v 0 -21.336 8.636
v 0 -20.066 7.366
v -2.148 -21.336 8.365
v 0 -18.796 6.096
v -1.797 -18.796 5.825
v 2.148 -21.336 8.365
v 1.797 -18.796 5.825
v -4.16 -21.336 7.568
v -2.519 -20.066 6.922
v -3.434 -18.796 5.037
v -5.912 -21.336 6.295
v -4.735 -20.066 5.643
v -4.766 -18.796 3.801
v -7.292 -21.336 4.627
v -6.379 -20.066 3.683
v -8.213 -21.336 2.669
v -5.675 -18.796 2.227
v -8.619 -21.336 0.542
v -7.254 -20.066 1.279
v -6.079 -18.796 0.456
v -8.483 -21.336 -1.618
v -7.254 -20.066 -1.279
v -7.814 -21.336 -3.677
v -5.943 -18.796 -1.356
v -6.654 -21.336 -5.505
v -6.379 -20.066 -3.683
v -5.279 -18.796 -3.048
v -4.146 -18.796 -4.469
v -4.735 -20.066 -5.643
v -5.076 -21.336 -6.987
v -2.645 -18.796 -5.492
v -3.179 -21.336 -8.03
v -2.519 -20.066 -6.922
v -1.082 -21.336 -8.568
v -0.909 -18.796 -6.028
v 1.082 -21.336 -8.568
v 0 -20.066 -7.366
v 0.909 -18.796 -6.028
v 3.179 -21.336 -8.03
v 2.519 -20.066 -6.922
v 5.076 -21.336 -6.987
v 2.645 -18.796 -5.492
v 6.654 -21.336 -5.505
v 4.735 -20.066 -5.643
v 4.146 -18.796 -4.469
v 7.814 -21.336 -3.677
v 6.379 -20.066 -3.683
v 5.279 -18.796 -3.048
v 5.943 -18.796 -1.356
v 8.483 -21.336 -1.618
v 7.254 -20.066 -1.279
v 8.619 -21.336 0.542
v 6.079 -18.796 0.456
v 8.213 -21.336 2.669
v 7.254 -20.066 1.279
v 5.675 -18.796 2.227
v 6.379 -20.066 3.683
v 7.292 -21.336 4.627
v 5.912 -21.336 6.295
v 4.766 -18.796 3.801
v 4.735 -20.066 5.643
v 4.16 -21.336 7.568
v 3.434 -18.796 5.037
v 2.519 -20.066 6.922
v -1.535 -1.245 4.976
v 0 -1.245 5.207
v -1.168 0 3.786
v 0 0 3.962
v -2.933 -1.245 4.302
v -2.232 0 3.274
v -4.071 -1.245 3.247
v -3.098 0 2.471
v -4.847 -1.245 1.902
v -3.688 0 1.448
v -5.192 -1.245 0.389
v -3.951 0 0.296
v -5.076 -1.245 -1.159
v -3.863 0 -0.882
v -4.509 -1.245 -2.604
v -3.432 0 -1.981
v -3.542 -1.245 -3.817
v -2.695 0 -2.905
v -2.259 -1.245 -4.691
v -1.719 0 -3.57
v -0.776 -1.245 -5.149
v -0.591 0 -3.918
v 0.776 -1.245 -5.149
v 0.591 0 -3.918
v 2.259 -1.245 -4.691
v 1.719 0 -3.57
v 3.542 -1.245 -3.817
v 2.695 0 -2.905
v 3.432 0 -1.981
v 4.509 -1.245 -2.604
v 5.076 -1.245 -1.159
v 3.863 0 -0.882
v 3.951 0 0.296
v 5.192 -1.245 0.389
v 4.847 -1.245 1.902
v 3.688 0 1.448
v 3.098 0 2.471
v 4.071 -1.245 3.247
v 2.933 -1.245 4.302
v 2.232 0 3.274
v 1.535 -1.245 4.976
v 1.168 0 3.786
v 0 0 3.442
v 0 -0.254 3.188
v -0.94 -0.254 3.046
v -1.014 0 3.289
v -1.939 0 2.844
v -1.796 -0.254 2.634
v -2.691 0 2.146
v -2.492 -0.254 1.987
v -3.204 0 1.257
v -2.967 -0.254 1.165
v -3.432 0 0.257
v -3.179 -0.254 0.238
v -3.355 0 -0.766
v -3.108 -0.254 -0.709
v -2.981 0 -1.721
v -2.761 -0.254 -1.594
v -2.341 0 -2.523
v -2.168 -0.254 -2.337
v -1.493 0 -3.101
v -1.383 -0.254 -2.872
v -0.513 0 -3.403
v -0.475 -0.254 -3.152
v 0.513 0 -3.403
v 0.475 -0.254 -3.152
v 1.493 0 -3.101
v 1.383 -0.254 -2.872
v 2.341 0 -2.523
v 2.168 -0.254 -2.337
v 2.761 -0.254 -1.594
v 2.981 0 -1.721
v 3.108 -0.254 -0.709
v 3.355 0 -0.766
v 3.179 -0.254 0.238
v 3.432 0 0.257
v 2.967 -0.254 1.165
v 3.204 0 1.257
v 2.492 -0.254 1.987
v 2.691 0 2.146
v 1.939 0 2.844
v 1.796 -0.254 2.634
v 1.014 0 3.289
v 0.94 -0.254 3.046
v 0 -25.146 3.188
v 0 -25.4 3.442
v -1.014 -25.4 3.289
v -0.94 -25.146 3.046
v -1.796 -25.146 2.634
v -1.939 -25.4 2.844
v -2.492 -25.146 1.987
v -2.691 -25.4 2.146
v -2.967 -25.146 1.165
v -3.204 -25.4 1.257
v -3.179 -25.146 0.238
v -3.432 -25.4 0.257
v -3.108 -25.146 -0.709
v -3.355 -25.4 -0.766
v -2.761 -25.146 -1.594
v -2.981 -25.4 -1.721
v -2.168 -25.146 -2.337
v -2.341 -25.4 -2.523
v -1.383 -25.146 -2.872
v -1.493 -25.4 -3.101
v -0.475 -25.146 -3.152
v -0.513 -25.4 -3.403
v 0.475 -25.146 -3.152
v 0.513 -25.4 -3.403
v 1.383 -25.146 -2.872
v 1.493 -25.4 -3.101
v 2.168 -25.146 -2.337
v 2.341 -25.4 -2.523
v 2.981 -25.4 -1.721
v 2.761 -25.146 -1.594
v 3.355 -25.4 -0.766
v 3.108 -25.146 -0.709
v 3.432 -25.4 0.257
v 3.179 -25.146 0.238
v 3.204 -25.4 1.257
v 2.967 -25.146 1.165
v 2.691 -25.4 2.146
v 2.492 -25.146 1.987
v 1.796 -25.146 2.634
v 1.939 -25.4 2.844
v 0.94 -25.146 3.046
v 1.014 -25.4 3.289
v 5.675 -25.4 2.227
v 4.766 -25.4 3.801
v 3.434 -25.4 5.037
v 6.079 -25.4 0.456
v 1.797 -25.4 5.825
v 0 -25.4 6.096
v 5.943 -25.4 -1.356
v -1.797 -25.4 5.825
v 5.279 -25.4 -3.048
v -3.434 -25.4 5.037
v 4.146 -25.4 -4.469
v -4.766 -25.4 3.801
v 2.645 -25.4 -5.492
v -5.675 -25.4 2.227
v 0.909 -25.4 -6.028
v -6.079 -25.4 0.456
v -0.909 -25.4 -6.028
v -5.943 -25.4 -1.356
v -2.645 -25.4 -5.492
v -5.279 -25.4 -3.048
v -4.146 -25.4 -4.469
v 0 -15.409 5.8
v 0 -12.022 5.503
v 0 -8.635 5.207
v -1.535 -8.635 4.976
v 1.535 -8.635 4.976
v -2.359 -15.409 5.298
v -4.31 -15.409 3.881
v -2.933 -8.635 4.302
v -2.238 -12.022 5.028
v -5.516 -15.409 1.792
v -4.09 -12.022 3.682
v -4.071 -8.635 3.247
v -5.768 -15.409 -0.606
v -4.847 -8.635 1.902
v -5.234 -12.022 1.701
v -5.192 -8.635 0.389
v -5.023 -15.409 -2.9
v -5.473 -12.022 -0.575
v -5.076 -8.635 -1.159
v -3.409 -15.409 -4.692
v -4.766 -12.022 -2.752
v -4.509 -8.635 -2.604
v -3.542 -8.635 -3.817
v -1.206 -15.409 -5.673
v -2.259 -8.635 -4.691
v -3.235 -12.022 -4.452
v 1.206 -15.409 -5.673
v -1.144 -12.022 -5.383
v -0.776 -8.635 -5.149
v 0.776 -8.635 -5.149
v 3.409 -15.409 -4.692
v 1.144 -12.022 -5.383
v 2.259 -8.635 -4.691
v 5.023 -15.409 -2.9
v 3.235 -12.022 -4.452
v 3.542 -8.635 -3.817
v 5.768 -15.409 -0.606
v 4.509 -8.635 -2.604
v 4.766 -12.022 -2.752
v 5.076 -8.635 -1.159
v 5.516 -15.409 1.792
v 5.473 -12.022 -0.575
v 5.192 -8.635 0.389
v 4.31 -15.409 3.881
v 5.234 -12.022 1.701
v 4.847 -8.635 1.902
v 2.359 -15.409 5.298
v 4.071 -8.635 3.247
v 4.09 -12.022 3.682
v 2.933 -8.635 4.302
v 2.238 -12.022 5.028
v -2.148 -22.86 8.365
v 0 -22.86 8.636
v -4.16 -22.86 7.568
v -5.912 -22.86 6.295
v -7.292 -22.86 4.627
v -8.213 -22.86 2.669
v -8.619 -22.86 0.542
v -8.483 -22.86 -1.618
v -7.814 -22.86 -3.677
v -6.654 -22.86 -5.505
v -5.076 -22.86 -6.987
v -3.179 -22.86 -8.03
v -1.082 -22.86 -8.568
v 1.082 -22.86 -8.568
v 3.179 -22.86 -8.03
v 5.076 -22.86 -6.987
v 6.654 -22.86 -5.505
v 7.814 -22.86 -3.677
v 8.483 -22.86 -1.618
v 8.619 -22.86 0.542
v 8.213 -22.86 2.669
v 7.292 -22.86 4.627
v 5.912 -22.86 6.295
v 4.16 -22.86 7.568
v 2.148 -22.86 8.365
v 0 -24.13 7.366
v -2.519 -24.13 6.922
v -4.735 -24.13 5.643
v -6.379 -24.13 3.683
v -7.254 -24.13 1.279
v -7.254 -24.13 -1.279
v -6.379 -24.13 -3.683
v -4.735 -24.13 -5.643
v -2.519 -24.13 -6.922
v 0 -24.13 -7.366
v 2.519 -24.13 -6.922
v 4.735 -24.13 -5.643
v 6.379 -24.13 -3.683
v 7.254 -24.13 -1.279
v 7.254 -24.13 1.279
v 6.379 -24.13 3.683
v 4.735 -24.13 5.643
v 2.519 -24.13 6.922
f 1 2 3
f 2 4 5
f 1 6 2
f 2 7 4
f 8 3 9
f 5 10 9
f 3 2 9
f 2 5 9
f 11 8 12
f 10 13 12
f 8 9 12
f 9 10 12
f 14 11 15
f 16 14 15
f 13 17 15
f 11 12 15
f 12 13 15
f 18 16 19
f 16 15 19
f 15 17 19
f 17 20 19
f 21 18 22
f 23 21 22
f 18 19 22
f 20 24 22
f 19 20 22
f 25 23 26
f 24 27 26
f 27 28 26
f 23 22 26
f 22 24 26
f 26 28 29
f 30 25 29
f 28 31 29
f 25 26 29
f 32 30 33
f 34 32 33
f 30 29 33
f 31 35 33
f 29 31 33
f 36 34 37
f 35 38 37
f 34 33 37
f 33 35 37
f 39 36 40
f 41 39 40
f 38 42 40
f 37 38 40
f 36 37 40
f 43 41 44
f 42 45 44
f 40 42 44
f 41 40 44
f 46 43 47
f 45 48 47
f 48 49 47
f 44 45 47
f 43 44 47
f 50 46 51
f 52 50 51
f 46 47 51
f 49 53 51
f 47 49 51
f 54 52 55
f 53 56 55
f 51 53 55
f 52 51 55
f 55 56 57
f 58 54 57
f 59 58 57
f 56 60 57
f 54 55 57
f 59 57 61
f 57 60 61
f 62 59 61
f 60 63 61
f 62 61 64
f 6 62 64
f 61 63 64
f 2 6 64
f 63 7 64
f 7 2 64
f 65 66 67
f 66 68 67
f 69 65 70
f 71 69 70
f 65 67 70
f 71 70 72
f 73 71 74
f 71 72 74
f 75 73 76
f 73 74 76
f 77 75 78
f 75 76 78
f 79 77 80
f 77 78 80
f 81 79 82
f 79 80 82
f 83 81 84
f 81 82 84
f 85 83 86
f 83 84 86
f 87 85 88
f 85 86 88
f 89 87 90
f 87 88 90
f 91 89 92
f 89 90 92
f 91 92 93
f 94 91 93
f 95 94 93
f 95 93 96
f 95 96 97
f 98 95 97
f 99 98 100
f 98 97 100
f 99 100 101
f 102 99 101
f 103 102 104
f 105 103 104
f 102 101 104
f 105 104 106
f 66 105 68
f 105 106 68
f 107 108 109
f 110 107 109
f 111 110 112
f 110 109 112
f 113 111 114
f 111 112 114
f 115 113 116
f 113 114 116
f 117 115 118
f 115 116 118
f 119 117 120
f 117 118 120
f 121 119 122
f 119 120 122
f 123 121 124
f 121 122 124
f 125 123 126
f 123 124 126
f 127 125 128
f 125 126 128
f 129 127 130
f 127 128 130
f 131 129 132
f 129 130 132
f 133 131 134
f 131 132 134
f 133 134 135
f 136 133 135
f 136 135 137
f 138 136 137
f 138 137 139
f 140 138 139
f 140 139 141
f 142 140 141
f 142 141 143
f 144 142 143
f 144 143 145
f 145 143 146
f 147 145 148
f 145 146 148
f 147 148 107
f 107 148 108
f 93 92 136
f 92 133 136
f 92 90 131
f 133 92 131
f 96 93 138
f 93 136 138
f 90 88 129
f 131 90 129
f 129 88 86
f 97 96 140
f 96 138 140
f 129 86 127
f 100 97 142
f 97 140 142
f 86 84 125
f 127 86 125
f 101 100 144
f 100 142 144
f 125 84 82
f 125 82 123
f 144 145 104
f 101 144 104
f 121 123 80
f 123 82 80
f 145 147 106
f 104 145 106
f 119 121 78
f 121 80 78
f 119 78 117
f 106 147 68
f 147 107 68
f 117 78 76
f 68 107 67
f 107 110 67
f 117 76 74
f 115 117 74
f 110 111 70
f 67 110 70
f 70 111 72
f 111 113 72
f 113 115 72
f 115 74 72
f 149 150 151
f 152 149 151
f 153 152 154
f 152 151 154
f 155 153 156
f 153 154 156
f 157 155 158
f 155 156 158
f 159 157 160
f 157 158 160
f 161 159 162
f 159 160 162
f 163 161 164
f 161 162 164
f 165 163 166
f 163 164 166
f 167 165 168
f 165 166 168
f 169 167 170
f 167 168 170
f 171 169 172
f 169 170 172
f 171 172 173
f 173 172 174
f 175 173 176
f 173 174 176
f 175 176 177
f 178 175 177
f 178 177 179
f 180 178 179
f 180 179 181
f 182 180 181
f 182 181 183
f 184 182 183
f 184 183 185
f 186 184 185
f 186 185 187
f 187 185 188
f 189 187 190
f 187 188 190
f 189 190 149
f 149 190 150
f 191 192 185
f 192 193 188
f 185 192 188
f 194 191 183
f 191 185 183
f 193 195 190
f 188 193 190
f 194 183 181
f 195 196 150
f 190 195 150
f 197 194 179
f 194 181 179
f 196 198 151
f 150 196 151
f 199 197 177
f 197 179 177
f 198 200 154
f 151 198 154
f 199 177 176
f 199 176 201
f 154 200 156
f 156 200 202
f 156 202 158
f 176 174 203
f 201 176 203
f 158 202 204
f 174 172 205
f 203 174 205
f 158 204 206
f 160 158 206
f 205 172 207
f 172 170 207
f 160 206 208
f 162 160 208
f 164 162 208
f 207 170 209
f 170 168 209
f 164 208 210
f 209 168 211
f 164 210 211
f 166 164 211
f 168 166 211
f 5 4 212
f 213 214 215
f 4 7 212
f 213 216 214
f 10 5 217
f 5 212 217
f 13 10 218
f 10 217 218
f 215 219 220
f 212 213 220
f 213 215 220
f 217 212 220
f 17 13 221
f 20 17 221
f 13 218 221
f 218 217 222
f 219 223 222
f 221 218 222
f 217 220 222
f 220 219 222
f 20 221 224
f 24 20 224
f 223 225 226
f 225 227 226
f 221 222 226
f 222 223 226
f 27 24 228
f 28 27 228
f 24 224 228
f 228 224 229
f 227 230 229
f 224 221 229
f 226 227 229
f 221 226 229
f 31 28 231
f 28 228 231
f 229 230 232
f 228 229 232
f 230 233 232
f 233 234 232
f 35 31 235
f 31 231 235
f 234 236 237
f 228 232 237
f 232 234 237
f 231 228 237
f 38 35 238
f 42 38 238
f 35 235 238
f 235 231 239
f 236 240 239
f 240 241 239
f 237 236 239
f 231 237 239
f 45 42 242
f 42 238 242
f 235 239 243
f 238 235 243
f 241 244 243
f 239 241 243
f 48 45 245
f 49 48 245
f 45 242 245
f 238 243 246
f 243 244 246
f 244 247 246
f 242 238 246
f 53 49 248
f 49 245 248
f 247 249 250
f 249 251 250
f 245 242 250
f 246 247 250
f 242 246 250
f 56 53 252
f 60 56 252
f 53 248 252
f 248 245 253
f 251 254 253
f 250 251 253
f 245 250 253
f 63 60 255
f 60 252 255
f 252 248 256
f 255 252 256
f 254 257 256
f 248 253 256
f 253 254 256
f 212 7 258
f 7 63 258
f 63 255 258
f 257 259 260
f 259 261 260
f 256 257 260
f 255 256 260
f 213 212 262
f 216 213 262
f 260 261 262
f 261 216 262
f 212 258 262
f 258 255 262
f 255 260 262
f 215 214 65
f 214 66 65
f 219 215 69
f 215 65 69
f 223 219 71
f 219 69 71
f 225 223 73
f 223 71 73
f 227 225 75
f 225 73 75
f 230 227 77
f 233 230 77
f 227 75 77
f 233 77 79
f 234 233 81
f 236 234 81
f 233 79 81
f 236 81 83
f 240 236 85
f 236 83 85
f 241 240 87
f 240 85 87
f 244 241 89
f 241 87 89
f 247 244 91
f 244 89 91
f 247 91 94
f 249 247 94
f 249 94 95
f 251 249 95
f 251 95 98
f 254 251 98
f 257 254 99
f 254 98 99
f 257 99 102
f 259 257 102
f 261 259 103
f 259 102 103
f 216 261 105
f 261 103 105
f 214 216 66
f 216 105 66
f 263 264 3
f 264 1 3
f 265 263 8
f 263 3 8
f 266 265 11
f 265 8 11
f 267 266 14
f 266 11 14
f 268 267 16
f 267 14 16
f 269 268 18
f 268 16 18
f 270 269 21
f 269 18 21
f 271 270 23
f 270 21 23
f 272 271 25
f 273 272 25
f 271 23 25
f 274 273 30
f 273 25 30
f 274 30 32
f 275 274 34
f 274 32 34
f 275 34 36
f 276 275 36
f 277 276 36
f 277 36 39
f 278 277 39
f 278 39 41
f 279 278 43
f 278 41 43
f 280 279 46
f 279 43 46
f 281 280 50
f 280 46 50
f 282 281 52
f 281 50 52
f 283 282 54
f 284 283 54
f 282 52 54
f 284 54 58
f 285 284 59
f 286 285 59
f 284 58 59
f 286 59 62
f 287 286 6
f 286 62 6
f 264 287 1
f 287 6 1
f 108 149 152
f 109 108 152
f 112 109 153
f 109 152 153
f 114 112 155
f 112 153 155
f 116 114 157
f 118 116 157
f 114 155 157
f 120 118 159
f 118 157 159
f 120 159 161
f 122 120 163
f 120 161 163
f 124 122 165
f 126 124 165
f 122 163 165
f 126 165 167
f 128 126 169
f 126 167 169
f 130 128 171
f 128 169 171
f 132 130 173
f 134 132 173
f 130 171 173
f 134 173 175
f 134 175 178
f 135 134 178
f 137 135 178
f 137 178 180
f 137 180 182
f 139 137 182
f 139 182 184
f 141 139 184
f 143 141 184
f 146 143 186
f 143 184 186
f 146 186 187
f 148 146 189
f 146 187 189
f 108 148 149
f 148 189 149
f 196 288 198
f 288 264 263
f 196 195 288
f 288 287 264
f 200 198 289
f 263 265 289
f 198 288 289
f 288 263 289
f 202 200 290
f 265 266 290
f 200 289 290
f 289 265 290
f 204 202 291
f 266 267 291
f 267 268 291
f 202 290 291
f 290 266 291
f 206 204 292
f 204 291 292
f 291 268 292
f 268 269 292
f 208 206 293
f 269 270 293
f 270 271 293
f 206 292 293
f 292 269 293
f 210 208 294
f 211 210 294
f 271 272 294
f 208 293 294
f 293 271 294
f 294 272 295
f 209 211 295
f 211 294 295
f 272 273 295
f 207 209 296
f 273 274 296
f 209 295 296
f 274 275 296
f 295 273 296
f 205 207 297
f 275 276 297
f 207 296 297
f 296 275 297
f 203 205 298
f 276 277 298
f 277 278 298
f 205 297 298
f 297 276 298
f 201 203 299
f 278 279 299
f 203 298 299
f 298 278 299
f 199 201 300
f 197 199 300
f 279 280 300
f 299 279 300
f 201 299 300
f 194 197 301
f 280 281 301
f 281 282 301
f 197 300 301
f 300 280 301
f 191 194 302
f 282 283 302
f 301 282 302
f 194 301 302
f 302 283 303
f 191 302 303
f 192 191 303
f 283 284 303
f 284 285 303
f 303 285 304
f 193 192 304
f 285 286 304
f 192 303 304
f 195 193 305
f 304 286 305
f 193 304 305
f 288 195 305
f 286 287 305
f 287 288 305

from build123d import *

# Parameters (mm, degrees)
CHAMFER1_SIZE = 0.254


with BuildPart() as part:
    # Sketch1 → Revolve1 (revolve)
    with BuildSketch(Plane.XY, mode=Mode.PRIVATE) as revolve1_sk:
        Polygon((-3.9624, 0), (-3.1877, 0), (-3.1877, -25.4), (-6.096, -25.4), (-8.636, -22.86), (-8.636, -21.336), (-6.096, -18.796), (-5.207, -8.634683503), (-5.207, -1.2446), align=None)
    revolve(revolve1_sk.sketch.rotate(Axis((0, 0, 0), (0, -1, 0)), 270), axis=Axis((0, 0, 0), (0, -1, 0)))

    # Chamfer1
    chamfer1_edges = [part.edges().sort_by_distance(p)[0] for p in [
        (0, 0, -3.1877),
        (0, -25.4, -3.1877),
    ]]
    chamfer(chamfer1_edges, length=CHAMFER1_SIZE)


solid = part.part
